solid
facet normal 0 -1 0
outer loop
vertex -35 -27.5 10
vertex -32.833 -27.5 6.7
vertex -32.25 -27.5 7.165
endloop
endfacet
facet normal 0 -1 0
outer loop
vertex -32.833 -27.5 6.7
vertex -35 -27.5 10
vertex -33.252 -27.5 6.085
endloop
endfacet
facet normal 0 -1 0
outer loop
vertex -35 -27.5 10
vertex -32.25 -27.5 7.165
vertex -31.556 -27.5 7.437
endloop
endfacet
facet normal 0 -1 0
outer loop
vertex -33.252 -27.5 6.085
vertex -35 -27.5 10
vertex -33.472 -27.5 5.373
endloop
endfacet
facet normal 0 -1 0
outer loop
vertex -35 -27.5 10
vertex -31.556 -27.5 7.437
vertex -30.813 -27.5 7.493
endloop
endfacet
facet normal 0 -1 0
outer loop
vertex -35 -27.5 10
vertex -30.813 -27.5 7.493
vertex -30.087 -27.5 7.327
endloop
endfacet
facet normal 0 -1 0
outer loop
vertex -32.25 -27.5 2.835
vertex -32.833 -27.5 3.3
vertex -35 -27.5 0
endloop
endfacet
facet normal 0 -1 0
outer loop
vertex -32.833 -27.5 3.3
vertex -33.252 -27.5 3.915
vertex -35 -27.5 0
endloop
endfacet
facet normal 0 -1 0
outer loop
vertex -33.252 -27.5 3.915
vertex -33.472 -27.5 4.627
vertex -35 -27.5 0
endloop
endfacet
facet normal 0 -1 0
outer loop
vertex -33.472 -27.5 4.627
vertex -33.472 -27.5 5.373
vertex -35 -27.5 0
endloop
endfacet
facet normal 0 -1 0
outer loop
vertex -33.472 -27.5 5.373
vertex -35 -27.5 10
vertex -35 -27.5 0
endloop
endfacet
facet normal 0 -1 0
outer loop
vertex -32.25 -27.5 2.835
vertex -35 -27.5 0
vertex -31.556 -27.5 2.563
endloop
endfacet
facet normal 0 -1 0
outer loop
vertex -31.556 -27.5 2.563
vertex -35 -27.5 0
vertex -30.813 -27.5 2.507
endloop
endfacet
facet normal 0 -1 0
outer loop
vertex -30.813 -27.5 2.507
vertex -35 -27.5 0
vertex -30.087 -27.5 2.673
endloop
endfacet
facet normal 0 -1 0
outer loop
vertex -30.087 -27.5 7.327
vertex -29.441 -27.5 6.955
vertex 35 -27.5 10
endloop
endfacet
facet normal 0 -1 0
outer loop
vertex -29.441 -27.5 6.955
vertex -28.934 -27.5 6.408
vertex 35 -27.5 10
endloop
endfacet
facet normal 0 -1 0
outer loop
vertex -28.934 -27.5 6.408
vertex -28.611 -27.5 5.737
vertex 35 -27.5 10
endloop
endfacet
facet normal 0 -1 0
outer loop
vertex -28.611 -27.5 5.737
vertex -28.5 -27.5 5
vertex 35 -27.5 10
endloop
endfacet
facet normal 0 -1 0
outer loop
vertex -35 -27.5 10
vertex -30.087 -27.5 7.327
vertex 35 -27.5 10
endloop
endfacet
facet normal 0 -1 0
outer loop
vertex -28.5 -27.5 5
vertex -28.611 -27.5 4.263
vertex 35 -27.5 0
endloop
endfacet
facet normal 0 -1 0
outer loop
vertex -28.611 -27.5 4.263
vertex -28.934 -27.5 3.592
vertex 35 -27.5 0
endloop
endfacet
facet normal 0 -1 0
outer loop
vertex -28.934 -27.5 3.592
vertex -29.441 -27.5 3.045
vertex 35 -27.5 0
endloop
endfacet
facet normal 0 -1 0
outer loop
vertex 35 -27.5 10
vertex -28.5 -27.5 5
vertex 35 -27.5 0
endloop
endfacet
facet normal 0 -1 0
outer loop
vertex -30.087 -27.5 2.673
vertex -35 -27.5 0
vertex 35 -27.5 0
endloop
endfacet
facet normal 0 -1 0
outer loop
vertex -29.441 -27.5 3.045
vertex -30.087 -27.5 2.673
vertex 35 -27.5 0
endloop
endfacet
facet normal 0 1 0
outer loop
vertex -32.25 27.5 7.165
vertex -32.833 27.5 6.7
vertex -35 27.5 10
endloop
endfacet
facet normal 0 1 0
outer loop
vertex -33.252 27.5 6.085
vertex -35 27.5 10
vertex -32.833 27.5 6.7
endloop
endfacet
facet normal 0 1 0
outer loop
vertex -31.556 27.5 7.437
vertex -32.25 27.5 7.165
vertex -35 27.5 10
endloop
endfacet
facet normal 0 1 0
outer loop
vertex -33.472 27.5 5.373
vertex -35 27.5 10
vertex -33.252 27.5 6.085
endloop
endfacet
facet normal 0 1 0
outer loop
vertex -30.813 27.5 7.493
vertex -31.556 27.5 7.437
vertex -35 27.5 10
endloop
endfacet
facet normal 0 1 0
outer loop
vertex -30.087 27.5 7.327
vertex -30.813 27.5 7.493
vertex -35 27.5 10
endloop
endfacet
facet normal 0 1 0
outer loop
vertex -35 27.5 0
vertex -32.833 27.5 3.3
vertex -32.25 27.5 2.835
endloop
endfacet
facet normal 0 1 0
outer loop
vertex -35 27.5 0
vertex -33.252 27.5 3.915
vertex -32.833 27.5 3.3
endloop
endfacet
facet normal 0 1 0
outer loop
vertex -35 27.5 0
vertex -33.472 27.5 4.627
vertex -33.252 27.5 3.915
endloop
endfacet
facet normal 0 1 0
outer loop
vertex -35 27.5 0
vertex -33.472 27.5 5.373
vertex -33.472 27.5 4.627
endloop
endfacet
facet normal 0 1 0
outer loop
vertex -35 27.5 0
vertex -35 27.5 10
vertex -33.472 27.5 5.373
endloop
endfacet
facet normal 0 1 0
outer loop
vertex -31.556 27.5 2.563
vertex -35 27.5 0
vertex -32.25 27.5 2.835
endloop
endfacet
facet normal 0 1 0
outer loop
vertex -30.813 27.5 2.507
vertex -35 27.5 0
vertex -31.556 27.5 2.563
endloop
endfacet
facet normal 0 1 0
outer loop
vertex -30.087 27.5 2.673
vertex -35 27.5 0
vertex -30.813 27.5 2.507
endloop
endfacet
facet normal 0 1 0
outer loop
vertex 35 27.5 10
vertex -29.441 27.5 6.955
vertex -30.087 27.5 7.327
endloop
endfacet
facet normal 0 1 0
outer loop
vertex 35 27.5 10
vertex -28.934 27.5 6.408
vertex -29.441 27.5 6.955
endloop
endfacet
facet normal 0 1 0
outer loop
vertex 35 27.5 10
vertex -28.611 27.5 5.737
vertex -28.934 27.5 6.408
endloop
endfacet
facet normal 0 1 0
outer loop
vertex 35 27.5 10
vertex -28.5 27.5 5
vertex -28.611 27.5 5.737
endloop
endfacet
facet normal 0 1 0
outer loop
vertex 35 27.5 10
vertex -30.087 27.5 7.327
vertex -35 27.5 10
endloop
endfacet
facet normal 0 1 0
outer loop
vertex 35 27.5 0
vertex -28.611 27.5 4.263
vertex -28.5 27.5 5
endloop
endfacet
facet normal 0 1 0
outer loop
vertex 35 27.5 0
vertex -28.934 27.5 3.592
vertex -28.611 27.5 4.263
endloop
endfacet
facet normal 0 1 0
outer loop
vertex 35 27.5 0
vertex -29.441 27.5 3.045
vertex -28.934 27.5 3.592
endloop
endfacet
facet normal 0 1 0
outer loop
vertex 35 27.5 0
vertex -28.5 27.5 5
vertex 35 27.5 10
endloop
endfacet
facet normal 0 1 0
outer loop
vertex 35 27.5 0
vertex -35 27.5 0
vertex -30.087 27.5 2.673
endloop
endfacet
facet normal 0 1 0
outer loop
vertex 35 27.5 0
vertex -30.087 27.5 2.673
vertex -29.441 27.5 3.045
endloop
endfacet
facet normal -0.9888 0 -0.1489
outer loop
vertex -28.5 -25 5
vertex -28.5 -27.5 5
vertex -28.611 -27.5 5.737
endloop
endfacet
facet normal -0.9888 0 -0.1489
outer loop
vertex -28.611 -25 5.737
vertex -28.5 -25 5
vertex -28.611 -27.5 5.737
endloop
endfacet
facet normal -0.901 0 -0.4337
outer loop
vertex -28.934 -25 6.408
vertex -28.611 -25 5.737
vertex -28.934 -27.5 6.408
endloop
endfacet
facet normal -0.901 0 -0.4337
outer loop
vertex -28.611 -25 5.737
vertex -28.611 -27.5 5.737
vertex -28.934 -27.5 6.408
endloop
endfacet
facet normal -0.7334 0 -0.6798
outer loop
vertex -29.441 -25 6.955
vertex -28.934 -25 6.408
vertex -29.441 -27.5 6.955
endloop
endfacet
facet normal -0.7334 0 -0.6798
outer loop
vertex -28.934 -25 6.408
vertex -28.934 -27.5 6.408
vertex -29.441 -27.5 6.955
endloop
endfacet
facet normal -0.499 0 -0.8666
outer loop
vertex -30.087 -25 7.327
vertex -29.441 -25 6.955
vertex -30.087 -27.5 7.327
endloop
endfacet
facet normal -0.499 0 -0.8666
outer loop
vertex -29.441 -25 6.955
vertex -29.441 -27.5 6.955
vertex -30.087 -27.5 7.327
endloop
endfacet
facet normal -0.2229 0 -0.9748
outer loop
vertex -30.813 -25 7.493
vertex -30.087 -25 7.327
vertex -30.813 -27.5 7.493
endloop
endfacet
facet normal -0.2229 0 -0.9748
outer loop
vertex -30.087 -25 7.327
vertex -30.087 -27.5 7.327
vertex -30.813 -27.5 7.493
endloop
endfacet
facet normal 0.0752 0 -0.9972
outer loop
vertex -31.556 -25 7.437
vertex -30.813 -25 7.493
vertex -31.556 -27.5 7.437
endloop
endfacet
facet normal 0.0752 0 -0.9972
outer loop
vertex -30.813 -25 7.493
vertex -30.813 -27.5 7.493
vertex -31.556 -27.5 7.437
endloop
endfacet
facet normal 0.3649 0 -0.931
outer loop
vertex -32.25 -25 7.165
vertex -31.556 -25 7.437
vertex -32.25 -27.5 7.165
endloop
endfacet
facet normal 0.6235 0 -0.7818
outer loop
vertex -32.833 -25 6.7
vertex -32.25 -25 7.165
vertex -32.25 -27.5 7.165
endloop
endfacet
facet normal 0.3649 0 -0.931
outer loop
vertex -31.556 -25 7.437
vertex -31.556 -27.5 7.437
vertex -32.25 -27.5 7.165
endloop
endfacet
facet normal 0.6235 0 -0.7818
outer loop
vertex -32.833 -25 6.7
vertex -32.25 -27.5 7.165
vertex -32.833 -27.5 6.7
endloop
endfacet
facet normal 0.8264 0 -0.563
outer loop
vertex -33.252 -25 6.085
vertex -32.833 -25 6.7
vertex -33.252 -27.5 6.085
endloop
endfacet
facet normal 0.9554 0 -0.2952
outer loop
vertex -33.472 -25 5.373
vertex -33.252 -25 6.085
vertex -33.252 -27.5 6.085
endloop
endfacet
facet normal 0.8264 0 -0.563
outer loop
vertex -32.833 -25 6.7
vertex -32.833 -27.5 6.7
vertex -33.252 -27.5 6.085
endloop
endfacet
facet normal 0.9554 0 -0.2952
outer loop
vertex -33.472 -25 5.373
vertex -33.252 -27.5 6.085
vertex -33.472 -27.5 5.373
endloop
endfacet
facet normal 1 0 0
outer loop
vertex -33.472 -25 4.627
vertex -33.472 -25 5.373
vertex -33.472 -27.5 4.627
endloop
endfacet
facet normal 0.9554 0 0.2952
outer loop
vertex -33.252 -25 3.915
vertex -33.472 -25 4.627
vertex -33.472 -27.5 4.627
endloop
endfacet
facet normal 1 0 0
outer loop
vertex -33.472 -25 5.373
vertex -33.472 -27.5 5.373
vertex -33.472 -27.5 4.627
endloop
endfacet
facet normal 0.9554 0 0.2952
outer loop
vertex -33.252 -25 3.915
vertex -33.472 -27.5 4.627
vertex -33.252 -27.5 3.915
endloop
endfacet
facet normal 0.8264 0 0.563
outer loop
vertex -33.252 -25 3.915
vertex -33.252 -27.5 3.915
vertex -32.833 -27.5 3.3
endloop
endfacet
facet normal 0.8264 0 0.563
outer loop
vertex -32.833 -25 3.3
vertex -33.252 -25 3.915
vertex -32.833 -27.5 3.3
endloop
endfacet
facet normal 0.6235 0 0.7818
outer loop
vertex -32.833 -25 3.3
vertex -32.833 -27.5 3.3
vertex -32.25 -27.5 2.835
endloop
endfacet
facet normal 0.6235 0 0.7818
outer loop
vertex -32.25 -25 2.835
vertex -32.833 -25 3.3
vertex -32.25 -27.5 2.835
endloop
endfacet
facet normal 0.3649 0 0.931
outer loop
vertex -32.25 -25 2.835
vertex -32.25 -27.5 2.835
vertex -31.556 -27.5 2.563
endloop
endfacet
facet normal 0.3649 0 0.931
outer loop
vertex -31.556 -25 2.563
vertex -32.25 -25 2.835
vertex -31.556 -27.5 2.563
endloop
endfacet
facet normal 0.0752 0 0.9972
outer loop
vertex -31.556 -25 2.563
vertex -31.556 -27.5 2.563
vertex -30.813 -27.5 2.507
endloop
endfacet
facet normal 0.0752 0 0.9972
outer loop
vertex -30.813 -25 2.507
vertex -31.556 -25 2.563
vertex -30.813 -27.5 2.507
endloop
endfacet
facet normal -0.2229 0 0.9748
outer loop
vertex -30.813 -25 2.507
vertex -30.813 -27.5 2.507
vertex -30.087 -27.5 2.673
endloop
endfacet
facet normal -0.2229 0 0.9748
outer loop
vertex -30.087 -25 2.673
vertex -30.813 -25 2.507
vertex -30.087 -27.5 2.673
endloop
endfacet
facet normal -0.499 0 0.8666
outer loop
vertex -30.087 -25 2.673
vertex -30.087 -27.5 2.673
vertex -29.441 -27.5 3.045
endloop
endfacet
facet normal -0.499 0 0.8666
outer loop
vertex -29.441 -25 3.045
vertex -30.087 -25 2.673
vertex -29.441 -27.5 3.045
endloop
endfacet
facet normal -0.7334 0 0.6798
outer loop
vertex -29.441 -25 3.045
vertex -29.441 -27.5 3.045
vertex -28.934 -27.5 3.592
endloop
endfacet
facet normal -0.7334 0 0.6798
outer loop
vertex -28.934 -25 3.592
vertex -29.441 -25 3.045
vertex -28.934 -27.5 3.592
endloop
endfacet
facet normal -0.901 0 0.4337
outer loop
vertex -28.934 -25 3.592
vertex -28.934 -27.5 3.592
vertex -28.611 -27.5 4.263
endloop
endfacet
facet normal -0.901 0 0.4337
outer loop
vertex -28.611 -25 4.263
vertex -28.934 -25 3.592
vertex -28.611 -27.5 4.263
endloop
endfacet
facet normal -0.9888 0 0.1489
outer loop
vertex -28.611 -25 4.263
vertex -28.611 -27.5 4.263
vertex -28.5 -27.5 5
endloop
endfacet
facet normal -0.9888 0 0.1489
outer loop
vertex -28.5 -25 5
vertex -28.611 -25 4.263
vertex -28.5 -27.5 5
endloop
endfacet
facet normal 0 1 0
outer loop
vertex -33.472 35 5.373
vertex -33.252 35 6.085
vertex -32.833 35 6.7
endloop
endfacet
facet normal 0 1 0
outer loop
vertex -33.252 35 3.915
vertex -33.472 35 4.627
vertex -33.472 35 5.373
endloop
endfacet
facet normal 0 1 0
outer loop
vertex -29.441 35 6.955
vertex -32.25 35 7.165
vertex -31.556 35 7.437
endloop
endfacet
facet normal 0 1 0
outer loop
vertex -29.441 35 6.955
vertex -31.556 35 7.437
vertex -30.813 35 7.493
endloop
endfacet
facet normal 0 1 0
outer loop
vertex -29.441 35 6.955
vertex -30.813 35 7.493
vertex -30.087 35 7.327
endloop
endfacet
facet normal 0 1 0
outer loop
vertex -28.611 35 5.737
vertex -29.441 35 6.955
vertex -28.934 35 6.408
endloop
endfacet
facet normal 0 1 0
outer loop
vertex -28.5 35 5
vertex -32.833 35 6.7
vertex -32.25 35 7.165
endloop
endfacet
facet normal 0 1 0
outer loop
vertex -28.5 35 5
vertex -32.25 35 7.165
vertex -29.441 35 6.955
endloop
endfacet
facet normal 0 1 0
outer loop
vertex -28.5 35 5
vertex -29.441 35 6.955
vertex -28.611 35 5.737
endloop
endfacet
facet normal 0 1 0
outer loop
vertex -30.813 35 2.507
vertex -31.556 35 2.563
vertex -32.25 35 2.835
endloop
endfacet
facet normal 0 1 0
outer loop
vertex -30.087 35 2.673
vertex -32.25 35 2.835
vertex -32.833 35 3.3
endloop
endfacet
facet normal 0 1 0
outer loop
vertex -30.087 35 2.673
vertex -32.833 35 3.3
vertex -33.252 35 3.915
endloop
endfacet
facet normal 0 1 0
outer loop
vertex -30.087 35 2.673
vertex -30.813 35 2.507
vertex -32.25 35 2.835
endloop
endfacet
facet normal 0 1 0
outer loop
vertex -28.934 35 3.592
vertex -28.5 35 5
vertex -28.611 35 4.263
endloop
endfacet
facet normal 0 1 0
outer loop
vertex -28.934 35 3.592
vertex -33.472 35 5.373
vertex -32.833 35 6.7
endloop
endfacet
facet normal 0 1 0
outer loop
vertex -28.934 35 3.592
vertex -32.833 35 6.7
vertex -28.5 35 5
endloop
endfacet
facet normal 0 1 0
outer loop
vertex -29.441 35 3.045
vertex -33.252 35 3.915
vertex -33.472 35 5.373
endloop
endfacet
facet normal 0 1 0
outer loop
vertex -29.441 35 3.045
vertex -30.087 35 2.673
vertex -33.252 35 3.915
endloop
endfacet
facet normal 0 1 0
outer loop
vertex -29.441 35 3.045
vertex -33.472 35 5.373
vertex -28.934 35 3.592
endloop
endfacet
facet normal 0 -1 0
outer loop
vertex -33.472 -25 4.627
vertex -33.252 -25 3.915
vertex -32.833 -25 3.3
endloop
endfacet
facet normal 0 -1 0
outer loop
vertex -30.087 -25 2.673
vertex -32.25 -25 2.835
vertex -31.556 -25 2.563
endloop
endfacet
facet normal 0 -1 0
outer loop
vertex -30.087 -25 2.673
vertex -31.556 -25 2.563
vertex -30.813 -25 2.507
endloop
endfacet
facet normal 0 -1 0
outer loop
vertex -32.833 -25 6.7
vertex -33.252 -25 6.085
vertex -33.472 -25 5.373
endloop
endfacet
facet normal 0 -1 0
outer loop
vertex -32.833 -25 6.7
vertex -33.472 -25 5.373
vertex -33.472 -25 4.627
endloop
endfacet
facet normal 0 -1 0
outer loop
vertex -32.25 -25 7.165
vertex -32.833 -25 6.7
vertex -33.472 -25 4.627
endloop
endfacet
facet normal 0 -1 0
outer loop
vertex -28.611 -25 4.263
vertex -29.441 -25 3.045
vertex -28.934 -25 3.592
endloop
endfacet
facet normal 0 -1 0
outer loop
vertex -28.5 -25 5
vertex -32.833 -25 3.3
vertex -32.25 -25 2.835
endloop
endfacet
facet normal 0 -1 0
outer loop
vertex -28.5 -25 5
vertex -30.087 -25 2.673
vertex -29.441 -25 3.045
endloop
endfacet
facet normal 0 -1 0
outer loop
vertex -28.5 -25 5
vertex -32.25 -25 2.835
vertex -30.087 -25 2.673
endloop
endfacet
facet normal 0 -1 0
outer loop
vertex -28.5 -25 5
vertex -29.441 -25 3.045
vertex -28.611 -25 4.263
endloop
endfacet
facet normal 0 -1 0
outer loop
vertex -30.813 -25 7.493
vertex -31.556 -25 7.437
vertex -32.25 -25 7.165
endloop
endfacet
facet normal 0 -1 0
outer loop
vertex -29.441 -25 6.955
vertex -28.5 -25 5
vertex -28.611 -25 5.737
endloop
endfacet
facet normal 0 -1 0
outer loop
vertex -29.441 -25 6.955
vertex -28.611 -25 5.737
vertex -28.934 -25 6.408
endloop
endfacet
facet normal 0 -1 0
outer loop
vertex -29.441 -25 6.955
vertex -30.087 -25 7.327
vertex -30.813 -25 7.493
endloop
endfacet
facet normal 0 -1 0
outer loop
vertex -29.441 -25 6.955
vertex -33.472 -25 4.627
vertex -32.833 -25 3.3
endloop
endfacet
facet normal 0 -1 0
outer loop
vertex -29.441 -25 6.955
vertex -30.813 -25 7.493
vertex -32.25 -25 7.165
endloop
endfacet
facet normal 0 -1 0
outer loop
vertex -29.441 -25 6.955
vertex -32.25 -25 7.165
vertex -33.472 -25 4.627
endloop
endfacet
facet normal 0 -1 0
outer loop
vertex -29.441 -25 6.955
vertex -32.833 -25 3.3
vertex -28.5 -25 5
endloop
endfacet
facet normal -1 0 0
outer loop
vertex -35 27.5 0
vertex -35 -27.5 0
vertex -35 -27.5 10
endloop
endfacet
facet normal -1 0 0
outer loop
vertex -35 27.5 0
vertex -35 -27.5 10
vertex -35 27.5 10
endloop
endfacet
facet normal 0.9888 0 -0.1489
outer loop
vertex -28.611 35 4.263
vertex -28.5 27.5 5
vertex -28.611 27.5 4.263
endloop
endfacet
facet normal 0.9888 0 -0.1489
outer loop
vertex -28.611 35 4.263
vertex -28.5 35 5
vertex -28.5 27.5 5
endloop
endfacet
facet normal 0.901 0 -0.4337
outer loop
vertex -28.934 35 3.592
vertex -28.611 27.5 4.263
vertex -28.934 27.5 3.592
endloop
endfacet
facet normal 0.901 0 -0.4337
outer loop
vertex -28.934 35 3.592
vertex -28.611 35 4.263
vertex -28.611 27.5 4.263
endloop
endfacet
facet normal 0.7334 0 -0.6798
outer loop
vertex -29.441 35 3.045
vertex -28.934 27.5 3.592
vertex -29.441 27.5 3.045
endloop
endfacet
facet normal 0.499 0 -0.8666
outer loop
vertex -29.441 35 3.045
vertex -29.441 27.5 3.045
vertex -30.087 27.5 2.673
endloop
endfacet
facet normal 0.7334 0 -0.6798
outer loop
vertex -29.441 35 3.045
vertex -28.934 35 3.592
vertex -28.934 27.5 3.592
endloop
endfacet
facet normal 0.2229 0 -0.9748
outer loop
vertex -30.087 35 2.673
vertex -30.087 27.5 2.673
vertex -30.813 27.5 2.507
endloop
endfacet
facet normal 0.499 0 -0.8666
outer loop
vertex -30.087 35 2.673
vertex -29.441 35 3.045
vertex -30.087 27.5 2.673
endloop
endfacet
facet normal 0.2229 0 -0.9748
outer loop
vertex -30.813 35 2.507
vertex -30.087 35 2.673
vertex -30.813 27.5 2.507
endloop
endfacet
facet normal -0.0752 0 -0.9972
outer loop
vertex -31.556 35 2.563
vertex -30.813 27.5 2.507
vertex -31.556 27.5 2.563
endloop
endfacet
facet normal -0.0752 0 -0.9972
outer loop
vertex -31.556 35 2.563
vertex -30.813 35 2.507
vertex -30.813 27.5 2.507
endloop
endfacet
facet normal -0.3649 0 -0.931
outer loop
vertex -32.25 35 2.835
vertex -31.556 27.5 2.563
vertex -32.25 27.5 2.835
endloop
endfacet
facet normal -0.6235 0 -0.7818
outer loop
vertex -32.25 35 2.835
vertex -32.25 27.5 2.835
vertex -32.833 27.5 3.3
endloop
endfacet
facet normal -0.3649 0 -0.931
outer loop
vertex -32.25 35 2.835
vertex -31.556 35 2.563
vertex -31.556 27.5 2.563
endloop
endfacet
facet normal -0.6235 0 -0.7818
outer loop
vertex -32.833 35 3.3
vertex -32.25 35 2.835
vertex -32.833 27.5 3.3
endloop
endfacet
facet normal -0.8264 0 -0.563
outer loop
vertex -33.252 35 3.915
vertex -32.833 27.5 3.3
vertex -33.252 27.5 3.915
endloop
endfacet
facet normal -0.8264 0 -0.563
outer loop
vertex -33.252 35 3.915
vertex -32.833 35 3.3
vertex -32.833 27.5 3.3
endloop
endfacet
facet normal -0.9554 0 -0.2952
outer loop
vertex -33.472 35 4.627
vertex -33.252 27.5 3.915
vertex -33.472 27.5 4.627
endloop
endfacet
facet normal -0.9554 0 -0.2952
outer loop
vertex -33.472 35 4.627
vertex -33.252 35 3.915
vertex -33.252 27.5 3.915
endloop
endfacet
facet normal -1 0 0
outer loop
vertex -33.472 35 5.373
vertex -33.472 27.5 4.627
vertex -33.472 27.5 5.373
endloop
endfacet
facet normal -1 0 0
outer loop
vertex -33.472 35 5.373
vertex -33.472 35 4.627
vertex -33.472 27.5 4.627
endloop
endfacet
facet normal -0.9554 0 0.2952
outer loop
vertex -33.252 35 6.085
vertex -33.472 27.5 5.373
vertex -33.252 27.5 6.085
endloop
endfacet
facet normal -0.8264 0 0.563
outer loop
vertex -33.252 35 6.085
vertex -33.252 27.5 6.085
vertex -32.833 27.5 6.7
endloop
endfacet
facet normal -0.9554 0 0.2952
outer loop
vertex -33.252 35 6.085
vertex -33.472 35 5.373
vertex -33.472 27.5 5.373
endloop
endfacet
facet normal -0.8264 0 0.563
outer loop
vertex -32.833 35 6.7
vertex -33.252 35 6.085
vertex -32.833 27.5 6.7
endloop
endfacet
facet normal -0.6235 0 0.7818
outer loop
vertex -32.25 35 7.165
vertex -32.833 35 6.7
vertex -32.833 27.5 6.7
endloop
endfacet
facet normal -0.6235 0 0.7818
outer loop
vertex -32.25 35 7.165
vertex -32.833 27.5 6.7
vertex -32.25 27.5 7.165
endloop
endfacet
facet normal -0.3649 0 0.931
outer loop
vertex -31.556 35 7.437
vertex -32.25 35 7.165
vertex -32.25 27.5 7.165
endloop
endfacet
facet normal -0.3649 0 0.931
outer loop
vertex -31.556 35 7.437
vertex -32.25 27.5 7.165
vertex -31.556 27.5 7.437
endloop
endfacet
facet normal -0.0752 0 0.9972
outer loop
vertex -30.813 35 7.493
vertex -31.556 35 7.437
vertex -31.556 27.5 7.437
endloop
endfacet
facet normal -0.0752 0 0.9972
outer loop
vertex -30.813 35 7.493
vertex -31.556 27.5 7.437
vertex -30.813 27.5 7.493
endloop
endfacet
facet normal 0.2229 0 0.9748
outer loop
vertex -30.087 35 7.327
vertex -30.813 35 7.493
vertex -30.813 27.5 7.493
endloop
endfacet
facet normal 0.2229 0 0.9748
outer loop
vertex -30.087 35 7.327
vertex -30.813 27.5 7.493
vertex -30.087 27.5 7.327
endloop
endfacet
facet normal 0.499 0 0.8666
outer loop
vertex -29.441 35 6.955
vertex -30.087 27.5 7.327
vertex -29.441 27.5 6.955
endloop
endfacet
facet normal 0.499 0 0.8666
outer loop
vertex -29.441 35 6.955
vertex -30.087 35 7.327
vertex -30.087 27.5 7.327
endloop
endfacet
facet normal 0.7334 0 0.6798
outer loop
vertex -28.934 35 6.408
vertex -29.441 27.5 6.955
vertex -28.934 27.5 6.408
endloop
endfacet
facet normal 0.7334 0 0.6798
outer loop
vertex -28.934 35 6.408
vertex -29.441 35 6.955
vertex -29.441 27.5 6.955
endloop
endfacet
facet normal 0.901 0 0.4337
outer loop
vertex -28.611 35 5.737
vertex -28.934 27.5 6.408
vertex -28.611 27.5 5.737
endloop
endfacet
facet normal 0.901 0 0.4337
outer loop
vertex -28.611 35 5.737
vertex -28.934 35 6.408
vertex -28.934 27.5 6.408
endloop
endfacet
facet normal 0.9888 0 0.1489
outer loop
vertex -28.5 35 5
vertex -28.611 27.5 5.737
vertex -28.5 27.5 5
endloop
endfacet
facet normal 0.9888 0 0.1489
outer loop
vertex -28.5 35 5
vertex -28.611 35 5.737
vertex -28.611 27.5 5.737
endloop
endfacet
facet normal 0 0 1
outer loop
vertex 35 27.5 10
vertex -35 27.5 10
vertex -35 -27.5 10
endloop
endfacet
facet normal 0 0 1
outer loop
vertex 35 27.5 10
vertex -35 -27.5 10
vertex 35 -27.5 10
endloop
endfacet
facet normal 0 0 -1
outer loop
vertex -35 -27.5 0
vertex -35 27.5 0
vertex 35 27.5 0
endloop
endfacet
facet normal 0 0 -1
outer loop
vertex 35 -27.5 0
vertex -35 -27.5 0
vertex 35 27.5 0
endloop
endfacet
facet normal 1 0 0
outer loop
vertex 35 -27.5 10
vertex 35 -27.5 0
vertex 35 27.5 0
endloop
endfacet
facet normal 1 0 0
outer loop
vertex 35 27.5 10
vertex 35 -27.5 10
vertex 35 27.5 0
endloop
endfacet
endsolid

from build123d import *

# Parameters (mm, degrees)
SKETCH1_W           = 70
SKETCH1_H           = 55
BOSS_EXTRUDE1_DEPTH = 10
SKETCH2_R           = 2.5
BOSS_EXTRUDE2_DEPTH = 35
SKETCH3_R           = 2.5
CUT_EXTRUDE1_DEPTH  = 10


with BuildPart() as part:
    # Sketch1 → Boss-Extrude1 (new body)
    with BuildSketch(Plane.XY):
        Rectangle(SKETCH1_W, SKETCH1_H)
    extrude(amount=BOSS_EXTRUDE1_DEPTH)

    # Sketch2 → Boss-Extrude2 (add, symmetric)
    with BuildSketch(Plane(origin=(0, 0, 0), x_dir=(1, 0, 0), z_dir=(0, 1, 0))):
        with Locations((-31, -5)):
            Circle(SKETCH2_R)
    extrude(amount=BOSS_EXTRUDE2_DEPTH, both=True)

    # Sketch3 → Cut-Extrude1 (cut)
    with BuildSketch(Plane.XZ.offset(35)):
        with Locations((-31, 5)):
            Circle(SKETCH3_R)
    extrude(amount=-CUT_EXTRUDE1_DEPTH, mode=Mode.SUBTRACT)


solid = part.part
